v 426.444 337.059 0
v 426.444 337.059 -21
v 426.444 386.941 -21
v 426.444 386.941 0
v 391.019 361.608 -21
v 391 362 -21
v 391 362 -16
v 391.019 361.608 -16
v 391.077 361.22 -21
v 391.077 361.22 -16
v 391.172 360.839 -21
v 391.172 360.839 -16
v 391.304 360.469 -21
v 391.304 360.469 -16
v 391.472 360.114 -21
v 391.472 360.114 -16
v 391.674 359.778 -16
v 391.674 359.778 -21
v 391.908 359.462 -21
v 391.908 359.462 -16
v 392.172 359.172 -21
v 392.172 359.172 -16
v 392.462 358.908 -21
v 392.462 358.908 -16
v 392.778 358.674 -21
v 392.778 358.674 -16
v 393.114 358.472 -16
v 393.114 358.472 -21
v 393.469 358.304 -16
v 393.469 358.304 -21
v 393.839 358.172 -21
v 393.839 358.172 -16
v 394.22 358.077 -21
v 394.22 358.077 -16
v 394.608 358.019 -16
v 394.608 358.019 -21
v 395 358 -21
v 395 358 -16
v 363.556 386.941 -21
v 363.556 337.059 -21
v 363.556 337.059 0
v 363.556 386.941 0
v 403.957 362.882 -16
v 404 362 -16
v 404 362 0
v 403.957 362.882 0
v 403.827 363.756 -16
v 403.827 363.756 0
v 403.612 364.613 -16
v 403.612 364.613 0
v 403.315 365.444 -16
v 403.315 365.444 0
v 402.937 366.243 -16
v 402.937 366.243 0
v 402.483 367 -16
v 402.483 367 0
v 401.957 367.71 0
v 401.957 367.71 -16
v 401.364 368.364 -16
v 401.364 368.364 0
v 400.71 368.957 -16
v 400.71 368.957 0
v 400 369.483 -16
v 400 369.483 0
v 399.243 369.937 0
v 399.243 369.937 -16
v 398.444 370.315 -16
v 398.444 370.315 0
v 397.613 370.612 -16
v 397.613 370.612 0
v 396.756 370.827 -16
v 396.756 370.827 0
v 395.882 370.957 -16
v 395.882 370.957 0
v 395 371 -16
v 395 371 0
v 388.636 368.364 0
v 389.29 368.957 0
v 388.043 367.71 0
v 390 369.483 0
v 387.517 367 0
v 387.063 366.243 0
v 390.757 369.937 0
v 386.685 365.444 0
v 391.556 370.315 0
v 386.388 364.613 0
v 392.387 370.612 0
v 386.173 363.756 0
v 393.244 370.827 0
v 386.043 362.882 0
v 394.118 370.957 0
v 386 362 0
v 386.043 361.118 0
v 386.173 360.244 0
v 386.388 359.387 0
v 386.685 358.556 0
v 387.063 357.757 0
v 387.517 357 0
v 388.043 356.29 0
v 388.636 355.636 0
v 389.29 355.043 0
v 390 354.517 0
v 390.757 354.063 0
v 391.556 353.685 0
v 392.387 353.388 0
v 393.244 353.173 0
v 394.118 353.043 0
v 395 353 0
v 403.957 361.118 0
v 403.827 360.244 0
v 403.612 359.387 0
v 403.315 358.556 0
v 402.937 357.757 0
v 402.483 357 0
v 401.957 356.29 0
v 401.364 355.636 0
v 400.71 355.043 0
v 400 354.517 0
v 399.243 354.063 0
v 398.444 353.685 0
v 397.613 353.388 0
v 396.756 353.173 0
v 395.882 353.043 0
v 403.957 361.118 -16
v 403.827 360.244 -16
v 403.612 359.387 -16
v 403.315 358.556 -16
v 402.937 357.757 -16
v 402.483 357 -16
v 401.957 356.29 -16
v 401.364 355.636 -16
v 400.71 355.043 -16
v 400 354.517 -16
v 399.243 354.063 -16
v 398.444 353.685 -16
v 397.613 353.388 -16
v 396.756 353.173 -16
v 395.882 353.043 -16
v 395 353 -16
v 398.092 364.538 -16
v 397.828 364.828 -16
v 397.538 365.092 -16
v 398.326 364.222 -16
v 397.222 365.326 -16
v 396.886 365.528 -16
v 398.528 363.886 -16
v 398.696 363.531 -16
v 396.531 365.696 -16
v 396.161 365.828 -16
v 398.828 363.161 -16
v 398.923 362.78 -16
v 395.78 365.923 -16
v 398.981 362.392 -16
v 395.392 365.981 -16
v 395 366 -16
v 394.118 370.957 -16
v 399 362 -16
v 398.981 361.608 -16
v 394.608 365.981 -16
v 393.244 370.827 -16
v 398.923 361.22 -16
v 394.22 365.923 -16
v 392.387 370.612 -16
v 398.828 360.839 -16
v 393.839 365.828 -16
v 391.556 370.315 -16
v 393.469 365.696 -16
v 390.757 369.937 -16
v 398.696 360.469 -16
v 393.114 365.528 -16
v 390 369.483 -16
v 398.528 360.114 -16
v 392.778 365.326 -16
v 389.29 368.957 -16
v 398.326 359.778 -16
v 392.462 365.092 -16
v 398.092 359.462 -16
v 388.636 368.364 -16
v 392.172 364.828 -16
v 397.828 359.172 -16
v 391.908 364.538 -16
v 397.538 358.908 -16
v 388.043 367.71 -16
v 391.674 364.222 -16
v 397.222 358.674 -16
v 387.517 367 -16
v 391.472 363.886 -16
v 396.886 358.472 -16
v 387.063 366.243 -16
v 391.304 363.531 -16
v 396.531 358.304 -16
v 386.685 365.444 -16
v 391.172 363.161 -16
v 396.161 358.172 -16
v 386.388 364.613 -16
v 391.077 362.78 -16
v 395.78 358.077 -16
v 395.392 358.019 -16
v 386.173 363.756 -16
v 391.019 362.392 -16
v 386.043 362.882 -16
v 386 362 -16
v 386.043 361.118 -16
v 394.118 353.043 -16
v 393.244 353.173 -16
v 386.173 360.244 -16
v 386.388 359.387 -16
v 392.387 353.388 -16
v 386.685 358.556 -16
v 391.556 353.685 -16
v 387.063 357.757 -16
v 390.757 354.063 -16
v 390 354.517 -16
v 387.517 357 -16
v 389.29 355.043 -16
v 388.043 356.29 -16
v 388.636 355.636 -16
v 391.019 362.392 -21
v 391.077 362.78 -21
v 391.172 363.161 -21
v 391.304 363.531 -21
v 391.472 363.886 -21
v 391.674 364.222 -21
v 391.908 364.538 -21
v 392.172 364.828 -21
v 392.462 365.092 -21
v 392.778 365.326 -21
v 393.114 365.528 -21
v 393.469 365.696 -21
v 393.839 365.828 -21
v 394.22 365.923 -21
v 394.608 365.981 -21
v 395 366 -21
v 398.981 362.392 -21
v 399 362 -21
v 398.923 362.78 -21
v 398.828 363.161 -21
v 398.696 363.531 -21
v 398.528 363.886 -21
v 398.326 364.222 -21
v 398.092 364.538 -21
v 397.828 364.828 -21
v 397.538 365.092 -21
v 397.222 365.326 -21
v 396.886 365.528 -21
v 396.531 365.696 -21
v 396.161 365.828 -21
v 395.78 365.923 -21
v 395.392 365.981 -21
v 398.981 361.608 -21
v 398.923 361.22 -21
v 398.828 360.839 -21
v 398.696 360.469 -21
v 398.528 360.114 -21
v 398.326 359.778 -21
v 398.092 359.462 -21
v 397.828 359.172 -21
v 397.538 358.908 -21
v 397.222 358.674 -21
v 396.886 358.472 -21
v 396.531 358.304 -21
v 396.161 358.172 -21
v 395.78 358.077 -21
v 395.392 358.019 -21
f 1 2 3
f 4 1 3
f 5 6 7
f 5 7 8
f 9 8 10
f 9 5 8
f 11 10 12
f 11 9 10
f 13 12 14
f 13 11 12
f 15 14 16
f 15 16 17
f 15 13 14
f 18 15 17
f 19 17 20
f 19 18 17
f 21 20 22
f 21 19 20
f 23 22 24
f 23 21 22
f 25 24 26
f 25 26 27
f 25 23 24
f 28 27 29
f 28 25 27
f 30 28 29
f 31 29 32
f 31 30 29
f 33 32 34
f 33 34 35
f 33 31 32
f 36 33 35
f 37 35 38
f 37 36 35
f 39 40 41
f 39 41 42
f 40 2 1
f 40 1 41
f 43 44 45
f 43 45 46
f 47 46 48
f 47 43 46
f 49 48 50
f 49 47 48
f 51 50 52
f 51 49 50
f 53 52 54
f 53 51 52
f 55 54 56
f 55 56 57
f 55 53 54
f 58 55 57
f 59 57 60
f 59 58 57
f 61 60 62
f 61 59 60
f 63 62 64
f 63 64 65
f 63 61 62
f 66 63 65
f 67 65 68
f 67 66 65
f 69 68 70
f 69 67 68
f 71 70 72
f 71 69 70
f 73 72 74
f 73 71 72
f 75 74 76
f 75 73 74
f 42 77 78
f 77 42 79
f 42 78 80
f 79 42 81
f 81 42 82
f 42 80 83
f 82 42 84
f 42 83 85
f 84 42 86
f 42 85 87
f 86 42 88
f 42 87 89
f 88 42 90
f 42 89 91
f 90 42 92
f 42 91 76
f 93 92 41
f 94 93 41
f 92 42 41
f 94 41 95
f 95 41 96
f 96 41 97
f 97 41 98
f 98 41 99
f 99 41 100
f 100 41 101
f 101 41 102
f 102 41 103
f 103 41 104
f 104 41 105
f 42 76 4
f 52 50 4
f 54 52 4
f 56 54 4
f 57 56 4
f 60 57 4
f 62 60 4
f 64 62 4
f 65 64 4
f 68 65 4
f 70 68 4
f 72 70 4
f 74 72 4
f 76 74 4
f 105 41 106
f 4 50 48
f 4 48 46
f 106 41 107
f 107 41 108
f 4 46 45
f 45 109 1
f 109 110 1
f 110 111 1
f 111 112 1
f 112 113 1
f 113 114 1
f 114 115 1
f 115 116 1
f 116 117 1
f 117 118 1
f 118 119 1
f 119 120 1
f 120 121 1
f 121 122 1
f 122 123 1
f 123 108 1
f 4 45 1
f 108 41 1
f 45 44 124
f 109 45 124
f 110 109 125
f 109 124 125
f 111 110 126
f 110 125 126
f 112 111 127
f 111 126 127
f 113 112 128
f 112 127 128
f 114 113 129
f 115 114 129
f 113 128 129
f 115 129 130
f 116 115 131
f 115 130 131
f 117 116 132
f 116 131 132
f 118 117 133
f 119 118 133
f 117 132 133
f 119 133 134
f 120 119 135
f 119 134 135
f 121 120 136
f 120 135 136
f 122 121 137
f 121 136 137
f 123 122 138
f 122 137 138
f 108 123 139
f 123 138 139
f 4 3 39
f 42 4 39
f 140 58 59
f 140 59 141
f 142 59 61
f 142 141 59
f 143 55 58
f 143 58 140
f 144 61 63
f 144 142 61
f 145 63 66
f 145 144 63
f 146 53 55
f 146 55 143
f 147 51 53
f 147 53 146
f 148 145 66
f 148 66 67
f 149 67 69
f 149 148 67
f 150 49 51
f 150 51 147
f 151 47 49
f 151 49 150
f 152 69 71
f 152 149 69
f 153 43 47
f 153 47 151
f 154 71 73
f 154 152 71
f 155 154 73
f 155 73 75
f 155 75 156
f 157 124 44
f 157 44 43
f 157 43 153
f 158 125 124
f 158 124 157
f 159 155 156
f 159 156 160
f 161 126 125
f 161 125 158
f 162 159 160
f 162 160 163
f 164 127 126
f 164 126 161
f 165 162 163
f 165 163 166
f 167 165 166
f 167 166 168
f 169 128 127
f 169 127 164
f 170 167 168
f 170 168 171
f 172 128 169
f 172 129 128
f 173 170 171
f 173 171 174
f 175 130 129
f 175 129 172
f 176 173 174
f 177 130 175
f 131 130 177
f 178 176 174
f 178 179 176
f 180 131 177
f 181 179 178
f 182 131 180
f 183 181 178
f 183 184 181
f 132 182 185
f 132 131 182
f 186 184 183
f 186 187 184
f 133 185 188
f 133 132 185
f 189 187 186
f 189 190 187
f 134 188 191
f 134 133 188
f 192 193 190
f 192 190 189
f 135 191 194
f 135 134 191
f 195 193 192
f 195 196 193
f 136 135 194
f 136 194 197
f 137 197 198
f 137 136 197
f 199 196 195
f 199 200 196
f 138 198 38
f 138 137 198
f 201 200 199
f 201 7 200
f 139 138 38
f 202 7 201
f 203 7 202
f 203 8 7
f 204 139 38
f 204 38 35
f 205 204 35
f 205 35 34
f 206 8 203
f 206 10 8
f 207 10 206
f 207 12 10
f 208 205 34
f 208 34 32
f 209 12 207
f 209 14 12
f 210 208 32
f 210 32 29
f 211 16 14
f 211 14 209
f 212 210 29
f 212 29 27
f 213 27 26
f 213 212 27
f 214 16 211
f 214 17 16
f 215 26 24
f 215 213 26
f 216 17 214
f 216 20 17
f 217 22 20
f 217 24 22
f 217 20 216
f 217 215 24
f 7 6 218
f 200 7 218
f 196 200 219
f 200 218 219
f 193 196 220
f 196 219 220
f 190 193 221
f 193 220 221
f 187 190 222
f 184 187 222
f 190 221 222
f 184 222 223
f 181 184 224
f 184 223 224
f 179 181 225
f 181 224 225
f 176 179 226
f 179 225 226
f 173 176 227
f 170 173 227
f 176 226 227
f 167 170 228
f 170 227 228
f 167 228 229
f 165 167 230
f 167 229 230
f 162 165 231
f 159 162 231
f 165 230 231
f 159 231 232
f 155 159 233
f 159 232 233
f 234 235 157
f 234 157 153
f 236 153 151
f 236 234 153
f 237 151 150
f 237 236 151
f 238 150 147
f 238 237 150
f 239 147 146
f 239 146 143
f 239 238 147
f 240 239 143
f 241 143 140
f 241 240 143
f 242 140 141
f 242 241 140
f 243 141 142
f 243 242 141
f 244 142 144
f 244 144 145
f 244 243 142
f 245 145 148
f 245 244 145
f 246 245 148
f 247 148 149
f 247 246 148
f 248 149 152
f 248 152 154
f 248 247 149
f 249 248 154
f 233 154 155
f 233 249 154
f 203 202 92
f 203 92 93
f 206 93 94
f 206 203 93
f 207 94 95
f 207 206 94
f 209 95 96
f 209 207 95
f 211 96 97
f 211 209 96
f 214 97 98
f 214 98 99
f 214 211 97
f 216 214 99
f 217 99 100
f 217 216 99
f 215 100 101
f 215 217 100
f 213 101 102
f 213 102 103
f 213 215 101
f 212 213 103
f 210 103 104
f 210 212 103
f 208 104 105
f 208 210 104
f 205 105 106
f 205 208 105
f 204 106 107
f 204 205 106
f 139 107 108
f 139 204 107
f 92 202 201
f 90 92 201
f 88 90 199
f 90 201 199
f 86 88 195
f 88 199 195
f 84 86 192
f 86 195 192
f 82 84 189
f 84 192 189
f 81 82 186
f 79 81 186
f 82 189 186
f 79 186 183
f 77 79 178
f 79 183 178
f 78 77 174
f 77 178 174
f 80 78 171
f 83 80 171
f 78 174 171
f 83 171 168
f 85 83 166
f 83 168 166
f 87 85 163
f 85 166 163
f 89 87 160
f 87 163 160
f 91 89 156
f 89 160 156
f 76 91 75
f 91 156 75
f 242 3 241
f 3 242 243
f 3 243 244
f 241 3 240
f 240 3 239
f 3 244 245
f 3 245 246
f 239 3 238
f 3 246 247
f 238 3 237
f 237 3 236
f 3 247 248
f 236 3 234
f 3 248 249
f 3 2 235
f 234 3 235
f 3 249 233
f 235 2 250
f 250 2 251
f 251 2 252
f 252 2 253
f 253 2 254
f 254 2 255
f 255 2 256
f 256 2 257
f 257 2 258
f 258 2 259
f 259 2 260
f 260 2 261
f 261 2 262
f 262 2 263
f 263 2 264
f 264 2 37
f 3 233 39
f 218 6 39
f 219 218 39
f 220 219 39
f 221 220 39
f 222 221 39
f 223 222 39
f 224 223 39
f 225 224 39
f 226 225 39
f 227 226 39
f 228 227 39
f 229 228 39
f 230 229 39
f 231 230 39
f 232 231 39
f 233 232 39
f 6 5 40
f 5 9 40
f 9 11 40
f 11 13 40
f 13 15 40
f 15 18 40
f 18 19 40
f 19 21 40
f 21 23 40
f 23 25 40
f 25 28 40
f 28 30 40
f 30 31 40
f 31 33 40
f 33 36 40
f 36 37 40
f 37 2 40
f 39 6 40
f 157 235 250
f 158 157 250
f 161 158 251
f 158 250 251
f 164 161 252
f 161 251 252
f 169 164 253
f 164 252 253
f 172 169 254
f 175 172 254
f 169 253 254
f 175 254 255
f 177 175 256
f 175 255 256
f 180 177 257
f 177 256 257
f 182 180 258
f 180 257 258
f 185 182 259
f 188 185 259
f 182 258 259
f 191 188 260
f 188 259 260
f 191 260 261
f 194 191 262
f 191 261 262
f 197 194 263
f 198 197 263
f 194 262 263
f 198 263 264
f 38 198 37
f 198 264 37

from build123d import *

# Parameters (mm, degrees)
PAD_DEPTH               = 21
PAD001_DEPTH            = 5
PAD_MIRRORED_2_DEPTH    = 21
PAD001_MIRRORED_2_DEPTH = 5


with BuildPart() as part:
    # Sketch → Pad (new body)
    with BuildSketch(Plane.XY):
        with BuildLine():
            ThreePointArc((9, 0), (6.363961, 6.363961), (0, 9))
            Line((0, 9), (0, 24.941391))
            Line((0, 24.941391), (31.444139, 24.941391))
            Line((31.444139, 24.941391), (31.444139, 0))
            Line((31.444139, 0), (9, 0))
        make_face()
    pad = extrude(amount=PAD_DEPTH)

    # Sketch001 → Pad001 (join)
    with BuildSketch(Plane.XY):
        with BuildLine():
            ThreePointArc((9, 0), (6.363961, 6.363961), (0, 9))
            Line((0, 9), (0, 4))
            ThreePointArc((4, 0), (2.828427, 2.828427), (0, 4))
            Line((4, 0), (9, 0))
        make_face()
    pad001 = extrude(amount=PAD001_DEPTH)

    # Sketch Mirrored 2 → Pad Mirrored 2 (add)
    with BuildSketch(Plane(origin=(0, 0, 0), x_dir=(-1, 0, 0), z_dir=(0, 0, -1))):
        with BuildLine():
            ThreePointArc((9, 0), (6.363961, 6.363961), (0, 9))
            Line((0, 9), (0, 24.941391))
            Line((0, 24.941391), (31.444139, 24.941391))
            Line((31.444139, 24.941391), (31.444139, 0))
            Line((31.444139, 0), (9, 0))
        make_face()
    pad_mirrored_2 = extrude(amount=-PAD_MIRRORED_2_DEPTH)

    # Sketch001 Mirrored 2 → Pad001 Mirrored 2 (add)
    with BuildSketch(Plane(origin=(0, 0, 0), x_dir=(-1, 0, 0), z_dir=(0, 0, -1))):
        with BuildLine():
            ThreePointArc((9, 0), (6.363961, 6.363961), (0, 9))
            Line((0, 9), (0, 4))
            ThreePointArc((4, 0), (2.828427, 2.828427), (0, 4))
            Line((4, 0), (9, 0))
        make_face()
    pad001_mirrored_2 = extrude(amount=-PAD001_MIRRORED_2_DEPTH)

    # Mirrored001: Pad, Pad001, Pad Mirrored 2, Pad001 Mirrored 2 across Sketch H_Axis
    add(pad.mirror(Plane.ZX))
    add(pad001.mirror(Plane.ZX))
    add(pad_mirrored_2.mirror(Plane.ZX))
    add(pad001_mirrored_2.mirror(Plane.ZX))


with BuildPart() as part_1:
    # Clone placement: moved
    add(part.part.moved(Location((395, 362, -21))))


solid = part_1.part
